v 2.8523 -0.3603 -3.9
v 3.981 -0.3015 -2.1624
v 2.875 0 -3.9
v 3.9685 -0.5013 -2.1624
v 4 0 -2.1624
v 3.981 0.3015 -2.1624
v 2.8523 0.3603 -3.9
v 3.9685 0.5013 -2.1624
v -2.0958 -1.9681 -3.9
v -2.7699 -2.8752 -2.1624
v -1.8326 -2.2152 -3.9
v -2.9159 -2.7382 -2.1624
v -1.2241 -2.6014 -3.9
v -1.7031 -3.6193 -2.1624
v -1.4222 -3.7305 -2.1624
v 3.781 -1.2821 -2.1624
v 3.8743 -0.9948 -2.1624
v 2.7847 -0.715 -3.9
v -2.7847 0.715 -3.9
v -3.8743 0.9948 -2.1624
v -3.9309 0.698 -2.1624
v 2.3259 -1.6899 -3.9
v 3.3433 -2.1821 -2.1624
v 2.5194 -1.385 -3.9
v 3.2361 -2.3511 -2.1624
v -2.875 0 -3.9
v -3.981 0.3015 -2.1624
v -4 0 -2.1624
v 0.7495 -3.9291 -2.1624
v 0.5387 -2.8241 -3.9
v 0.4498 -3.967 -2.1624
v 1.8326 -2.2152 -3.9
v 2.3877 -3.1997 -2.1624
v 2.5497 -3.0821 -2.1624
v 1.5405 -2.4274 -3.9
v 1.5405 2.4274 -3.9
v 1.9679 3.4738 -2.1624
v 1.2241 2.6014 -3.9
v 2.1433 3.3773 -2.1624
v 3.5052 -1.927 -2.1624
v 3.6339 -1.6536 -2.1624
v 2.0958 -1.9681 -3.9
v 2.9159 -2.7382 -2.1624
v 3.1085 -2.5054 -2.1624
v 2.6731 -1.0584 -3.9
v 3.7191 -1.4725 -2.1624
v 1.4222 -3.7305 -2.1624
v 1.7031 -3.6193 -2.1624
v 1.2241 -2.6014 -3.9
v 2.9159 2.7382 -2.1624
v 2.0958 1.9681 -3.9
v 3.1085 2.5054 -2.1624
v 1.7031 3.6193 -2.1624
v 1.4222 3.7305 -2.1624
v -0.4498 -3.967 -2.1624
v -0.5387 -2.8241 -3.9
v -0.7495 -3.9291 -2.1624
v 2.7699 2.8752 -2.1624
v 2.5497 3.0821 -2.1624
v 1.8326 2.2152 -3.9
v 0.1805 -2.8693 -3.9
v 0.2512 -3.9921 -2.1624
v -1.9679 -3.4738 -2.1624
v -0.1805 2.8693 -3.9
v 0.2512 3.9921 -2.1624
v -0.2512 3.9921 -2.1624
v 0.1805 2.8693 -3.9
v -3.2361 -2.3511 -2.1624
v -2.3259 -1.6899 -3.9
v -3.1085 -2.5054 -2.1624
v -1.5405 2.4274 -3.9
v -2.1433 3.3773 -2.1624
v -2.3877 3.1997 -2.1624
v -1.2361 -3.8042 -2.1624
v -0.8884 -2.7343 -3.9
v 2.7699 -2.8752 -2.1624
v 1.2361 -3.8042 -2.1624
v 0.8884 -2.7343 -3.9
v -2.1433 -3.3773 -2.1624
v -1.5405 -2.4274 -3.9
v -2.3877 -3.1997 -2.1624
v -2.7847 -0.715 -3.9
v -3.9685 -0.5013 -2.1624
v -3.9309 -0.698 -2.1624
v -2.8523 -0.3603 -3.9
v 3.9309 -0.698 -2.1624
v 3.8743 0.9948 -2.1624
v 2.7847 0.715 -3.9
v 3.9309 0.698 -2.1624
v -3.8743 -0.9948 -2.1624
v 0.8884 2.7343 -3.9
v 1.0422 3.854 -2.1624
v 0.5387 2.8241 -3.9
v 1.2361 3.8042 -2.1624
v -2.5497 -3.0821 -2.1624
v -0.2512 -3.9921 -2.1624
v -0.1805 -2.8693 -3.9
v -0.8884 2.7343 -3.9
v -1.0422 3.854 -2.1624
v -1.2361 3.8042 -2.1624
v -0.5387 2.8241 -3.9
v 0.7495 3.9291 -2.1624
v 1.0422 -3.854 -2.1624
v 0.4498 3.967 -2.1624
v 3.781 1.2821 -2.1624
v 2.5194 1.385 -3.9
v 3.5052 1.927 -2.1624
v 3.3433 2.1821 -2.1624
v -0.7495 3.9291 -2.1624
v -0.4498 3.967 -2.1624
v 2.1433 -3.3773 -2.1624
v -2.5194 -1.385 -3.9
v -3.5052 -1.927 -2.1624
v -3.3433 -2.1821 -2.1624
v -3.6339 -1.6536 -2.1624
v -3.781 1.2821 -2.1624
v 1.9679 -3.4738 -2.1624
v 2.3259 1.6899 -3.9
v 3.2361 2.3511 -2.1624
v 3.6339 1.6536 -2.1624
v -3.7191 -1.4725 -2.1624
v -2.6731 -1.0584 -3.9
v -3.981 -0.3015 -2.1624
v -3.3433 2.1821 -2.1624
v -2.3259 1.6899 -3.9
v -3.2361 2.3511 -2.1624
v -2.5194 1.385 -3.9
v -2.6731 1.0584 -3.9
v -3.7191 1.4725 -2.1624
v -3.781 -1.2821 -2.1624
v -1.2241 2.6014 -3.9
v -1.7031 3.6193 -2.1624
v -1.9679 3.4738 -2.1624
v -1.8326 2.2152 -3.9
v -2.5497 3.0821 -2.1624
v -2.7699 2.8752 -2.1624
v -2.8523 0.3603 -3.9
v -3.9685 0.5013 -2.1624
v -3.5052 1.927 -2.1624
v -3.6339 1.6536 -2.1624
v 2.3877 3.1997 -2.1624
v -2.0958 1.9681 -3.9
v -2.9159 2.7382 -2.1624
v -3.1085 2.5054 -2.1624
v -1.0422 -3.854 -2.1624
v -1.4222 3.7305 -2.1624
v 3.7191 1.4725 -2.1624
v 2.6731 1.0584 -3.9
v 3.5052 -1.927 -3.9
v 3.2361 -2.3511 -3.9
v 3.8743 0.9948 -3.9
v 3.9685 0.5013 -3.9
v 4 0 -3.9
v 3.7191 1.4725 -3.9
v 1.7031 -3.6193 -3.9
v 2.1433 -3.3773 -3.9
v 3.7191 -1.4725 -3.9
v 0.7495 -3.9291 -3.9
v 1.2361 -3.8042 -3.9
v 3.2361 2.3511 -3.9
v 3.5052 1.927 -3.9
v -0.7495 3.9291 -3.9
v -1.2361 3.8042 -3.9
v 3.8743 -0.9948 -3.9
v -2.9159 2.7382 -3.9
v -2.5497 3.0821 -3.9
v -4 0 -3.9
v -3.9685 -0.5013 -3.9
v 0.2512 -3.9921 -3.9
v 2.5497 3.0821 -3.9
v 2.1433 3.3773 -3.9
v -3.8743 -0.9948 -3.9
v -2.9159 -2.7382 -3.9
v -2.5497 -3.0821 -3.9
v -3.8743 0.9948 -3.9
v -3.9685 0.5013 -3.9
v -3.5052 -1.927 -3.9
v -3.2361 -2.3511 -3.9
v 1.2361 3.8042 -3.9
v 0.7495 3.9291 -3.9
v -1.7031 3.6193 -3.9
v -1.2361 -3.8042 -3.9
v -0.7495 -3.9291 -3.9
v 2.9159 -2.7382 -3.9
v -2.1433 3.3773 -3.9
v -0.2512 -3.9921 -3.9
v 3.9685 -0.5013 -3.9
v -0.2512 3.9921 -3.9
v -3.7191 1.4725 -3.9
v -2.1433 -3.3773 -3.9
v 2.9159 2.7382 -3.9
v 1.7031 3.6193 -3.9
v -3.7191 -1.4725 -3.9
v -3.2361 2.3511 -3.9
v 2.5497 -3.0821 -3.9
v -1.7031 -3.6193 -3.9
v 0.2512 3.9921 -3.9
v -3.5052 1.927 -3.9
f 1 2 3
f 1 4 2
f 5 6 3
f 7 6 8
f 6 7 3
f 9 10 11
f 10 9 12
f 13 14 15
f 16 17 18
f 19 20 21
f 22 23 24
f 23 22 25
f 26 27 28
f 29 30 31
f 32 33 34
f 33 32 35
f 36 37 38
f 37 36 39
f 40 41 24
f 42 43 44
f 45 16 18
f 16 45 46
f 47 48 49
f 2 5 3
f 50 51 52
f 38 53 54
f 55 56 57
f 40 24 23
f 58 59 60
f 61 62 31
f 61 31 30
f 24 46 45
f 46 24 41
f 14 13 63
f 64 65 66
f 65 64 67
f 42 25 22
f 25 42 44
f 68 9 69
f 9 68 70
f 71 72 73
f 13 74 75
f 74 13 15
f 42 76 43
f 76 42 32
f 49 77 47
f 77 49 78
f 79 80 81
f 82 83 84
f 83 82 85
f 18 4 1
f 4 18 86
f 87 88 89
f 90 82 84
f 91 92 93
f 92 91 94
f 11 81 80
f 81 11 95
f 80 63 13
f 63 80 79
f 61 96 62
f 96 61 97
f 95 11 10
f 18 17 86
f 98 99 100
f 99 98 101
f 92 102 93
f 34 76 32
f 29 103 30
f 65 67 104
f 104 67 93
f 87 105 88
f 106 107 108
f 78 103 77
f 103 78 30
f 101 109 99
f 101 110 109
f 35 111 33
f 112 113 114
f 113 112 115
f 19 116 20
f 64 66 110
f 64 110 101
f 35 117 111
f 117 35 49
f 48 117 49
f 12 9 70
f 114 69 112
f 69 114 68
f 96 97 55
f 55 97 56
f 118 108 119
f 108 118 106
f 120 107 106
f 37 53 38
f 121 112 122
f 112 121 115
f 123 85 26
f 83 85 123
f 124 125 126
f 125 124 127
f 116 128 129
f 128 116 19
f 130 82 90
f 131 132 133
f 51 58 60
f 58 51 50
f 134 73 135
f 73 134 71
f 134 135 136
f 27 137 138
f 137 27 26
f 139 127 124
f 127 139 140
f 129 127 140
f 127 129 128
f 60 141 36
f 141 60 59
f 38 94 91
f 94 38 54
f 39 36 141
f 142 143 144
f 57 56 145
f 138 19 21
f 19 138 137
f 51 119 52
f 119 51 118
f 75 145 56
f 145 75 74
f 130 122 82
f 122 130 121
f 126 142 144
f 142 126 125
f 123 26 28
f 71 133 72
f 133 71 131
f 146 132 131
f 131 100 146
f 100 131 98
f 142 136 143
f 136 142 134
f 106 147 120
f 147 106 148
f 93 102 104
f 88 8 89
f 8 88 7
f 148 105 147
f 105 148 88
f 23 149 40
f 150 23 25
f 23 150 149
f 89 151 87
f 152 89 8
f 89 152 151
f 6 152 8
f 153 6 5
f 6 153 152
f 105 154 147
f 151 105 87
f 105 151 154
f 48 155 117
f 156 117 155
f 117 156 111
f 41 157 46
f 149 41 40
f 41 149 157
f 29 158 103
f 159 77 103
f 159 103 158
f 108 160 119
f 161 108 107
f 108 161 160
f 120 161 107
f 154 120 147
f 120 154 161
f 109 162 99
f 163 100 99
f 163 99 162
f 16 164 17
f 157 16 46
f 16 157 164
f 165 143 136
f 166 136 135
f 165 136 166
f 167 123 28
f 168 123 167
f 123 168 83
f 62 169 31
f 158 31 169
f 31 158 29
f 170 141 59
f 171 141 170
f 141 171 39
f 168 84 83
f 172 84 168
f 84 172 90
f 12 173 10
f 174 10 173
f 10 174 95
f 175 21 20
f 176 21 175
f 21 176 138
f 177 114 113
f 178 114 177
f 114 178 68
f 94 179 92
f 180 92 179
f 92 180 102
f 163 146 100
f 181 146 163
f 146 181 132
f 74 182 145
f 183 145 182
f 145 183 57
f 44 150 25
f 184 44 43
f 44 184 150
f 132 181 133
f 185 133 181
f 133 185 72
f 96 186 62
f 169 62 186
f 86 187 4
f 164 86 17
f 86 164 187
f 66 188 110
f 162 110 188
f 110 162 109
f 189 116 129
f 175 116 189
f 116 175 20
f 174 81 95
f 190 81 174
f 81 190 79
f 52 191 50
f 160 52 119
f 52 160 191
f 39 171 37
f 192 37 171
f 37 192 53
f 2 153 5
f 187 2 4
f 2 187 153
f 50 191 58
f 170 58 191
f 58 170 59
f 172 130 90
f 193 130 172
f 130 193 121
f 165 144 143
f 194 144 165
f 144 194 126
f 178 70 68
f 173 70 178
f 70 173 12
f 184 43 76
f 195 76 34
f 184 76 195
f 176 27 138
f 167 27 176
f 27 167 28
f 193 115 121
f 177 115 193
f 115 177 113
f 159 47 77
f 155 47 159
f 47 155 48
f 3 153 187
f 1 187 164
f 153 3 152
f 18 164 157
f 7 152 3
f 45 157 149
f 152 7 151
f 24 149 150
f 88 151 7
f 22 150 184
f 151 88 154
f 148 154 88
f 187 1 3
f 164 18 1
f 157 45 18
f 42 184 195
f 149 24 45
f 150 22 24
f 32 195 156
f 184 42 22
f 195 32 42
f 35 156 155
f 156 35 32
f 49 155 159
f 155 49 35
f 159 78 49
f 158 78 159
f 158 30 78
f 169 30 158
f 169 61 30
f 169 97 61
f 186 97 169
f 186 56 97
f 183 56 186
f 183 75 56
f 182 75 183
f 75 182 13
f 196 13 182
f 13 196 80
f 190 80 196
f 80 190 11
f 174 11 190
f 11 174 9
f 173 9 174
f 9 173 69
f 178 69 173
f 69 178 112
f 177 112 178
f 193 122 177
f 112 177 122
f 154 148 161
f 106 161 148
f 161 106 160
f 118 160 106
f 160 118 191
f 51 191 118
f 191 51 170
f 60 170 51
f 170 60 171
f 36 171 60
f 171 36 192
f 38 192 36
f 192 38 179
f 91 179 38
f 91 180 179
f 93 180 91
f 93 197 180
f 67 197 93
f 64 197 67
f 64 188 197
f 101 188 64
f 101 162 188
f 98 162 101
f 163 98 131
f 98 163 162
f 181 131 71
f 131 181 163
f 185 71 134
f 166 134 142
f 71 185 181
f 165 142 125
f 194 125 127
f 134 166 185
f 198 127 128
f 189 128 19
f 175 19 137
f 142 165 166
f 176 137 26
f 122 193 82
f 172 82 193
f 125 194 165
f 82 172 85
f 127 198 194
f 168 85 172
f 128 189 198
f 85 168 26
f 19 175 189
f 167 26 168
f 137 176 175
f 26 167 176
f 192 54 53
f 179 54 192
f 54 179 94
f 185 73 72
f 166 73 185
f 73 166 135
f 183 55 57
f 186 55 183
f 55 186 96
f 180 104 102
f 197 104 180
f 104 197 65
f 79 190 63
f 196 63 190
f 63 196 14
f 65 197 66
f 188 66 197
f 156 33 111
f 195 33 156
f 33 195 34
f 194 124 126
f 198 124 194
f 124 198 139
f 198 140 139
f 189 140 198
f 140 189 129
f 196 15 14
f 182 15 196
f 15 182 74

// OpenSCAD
$fn = 50;

difference() {
	union() {
		translate(v = [0, 0, -3.9000000000000004]) {
			cylinder(h = 6.9, r = 4.0);
		}
	}
	union() {
		translate(v = [0, 0, 0]) {
			rotate(a = [0, 0, 0]) {
				difference() {
					union() {
						translate(v = [0, 0, -6.9]) {
							cylinder(h = 6.9, r = 2.6);
						}
						translate(v = [0, 0, -3.9]) {
							cylinder(h = 3.9, r1 = 2.875, r2 = 5.4);
						}
						translate(v = [0, 0, -6.9]) {
							cylinder(h = 6.9, r = 2.875);
						}
						translate(v = [0, 0, -6.9]) {
							cylinder(h = 6.9, r = 2.6);
						}
					}
					union();
				}
			}
		}
		#cylinder(h = 3, r = 5.0);
	}
}
